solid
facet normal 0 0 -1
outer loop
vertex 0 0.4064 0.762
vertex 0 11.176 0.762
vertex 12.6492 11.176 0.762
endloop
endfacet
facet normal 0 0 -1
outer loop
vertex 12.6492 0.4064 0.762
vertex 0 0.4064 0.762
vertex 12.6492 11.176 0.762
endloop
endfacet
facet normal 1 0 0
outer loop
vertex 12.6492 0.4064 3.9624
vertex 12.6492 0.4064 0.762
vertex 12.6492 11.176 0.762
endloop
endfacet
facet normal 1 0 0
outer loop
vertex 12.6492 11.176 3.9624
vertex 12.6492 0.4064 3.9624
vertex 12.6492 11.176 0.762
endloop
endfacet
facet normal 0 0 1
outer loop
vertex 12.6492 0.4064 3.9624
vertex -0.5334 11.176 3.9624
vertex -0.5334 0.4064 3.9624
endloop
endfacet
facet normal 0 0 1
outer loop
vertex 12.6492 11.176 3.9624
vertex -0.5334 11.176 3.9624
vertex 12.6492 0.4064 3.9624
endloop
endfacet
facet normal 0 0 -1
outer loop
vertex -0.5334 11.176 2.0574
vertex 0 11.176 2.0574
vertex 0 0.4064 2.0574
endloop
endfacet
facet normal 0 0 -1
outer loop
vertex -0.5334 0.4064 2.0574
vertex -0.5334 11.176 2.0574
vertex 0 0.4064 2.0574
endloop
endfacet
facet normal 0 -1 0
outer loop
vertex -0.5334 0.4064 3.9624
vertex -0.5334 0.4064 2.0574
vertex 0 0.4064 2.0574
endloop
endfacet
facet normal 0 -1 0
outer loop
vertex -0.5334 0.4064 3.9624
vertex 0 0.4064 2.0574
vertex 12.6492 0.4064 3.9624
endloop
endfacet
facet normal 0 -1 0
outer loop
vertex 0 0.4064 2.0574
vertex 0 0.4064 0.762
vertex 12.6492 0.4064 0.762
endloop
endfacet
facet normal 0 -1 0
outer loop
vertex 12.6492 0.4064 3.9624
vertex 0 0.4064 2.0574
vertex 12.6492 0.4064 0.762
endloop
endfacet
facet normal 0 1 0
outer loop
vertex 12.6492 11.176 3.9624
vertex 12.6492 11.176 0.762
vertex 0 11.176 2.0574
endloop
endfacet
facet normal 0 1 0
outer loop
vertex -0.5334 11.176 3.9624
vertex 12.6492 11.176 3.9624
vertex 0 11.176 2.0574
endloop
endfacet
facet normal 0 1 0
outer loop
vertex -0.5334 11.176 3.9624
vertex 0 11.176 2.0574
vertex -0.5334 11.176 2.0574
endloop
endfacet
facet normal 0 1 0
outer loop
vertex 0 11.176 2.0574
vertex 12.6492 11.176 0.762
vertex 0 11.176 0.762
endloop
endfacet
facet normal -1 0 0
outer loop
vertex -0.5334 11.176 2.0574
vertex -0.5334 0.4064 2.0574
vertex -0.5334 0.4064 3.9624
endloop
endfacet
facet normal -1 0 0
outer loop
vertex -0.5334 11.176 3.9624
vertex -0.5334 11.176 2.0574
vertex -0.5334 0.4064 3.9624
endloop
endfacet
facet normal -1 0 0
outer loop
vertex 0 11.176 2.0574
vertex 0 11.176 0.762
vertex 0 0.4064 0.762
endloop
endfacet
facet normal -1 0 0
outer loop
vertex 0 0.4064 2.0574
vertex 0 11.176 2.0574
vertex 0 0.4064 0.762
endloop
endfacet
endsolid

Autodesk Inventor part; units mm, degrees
ref_plane "YZ Plane" through (0, 0, 0) normal (1, 0, 0) x (0, 1, 0)
ref_plane "XZ Plane" through (0, 0, 0) normal (0, 1, 0) x (-1, 0, 0)
sketch "Sketch1" plane through (0, 0, 0) normal (0, 0, 1) x (1, 0, 0)
  line L0 (0, 0) -> (12.6492, 0)
  line L1 (12.6492, 0) -> (12.6492, 11.176)
  line L2 (12.6492, 11.176) -> (0, 11.176)
  line L3 (0, 11.176) -> (0, 0)
  dimension "d0" = 12.6492
  dimension "d1" = 11.176
extrude "Extrusion1" add sketch "Sketch1" along normal blind 3.9624
sketch "Sketch2" plane through (0, 0, 0) normal (-1, 0, 0) x (0, 0, 1)
  line L0 (0, 0) -> (3.9624, 0) projected
  line L1 (3.9624, 11.176) -> (2.0574, 11.176)
  line L2 (2.0574, 11.176) -> (2.0574, 0)
  line L3 (2.0574, 0) -> (3.9624, 0)
  line L4 (3.9624, 0) -> (3.9624, 11.176)
  dimension "d4" = 1.905
ref_plane "Work Plane1" through (-0.5334, -0.3048, 5.08) normal (-1, 0, 0) x (0, 0, 1)
extrude "Extrusion2" add sketch "Sketch2" along normal up to surface (0.5334 mm away)
move faces "Move Face1" translate (0, 0.4064, 0) faces at (8.4328, 0, 2.0066)
move faces "Move Face2" translate (0, 0, 0.762) faces at (4.2164, 7.5861, 0)
properties part number "body_encoder"
